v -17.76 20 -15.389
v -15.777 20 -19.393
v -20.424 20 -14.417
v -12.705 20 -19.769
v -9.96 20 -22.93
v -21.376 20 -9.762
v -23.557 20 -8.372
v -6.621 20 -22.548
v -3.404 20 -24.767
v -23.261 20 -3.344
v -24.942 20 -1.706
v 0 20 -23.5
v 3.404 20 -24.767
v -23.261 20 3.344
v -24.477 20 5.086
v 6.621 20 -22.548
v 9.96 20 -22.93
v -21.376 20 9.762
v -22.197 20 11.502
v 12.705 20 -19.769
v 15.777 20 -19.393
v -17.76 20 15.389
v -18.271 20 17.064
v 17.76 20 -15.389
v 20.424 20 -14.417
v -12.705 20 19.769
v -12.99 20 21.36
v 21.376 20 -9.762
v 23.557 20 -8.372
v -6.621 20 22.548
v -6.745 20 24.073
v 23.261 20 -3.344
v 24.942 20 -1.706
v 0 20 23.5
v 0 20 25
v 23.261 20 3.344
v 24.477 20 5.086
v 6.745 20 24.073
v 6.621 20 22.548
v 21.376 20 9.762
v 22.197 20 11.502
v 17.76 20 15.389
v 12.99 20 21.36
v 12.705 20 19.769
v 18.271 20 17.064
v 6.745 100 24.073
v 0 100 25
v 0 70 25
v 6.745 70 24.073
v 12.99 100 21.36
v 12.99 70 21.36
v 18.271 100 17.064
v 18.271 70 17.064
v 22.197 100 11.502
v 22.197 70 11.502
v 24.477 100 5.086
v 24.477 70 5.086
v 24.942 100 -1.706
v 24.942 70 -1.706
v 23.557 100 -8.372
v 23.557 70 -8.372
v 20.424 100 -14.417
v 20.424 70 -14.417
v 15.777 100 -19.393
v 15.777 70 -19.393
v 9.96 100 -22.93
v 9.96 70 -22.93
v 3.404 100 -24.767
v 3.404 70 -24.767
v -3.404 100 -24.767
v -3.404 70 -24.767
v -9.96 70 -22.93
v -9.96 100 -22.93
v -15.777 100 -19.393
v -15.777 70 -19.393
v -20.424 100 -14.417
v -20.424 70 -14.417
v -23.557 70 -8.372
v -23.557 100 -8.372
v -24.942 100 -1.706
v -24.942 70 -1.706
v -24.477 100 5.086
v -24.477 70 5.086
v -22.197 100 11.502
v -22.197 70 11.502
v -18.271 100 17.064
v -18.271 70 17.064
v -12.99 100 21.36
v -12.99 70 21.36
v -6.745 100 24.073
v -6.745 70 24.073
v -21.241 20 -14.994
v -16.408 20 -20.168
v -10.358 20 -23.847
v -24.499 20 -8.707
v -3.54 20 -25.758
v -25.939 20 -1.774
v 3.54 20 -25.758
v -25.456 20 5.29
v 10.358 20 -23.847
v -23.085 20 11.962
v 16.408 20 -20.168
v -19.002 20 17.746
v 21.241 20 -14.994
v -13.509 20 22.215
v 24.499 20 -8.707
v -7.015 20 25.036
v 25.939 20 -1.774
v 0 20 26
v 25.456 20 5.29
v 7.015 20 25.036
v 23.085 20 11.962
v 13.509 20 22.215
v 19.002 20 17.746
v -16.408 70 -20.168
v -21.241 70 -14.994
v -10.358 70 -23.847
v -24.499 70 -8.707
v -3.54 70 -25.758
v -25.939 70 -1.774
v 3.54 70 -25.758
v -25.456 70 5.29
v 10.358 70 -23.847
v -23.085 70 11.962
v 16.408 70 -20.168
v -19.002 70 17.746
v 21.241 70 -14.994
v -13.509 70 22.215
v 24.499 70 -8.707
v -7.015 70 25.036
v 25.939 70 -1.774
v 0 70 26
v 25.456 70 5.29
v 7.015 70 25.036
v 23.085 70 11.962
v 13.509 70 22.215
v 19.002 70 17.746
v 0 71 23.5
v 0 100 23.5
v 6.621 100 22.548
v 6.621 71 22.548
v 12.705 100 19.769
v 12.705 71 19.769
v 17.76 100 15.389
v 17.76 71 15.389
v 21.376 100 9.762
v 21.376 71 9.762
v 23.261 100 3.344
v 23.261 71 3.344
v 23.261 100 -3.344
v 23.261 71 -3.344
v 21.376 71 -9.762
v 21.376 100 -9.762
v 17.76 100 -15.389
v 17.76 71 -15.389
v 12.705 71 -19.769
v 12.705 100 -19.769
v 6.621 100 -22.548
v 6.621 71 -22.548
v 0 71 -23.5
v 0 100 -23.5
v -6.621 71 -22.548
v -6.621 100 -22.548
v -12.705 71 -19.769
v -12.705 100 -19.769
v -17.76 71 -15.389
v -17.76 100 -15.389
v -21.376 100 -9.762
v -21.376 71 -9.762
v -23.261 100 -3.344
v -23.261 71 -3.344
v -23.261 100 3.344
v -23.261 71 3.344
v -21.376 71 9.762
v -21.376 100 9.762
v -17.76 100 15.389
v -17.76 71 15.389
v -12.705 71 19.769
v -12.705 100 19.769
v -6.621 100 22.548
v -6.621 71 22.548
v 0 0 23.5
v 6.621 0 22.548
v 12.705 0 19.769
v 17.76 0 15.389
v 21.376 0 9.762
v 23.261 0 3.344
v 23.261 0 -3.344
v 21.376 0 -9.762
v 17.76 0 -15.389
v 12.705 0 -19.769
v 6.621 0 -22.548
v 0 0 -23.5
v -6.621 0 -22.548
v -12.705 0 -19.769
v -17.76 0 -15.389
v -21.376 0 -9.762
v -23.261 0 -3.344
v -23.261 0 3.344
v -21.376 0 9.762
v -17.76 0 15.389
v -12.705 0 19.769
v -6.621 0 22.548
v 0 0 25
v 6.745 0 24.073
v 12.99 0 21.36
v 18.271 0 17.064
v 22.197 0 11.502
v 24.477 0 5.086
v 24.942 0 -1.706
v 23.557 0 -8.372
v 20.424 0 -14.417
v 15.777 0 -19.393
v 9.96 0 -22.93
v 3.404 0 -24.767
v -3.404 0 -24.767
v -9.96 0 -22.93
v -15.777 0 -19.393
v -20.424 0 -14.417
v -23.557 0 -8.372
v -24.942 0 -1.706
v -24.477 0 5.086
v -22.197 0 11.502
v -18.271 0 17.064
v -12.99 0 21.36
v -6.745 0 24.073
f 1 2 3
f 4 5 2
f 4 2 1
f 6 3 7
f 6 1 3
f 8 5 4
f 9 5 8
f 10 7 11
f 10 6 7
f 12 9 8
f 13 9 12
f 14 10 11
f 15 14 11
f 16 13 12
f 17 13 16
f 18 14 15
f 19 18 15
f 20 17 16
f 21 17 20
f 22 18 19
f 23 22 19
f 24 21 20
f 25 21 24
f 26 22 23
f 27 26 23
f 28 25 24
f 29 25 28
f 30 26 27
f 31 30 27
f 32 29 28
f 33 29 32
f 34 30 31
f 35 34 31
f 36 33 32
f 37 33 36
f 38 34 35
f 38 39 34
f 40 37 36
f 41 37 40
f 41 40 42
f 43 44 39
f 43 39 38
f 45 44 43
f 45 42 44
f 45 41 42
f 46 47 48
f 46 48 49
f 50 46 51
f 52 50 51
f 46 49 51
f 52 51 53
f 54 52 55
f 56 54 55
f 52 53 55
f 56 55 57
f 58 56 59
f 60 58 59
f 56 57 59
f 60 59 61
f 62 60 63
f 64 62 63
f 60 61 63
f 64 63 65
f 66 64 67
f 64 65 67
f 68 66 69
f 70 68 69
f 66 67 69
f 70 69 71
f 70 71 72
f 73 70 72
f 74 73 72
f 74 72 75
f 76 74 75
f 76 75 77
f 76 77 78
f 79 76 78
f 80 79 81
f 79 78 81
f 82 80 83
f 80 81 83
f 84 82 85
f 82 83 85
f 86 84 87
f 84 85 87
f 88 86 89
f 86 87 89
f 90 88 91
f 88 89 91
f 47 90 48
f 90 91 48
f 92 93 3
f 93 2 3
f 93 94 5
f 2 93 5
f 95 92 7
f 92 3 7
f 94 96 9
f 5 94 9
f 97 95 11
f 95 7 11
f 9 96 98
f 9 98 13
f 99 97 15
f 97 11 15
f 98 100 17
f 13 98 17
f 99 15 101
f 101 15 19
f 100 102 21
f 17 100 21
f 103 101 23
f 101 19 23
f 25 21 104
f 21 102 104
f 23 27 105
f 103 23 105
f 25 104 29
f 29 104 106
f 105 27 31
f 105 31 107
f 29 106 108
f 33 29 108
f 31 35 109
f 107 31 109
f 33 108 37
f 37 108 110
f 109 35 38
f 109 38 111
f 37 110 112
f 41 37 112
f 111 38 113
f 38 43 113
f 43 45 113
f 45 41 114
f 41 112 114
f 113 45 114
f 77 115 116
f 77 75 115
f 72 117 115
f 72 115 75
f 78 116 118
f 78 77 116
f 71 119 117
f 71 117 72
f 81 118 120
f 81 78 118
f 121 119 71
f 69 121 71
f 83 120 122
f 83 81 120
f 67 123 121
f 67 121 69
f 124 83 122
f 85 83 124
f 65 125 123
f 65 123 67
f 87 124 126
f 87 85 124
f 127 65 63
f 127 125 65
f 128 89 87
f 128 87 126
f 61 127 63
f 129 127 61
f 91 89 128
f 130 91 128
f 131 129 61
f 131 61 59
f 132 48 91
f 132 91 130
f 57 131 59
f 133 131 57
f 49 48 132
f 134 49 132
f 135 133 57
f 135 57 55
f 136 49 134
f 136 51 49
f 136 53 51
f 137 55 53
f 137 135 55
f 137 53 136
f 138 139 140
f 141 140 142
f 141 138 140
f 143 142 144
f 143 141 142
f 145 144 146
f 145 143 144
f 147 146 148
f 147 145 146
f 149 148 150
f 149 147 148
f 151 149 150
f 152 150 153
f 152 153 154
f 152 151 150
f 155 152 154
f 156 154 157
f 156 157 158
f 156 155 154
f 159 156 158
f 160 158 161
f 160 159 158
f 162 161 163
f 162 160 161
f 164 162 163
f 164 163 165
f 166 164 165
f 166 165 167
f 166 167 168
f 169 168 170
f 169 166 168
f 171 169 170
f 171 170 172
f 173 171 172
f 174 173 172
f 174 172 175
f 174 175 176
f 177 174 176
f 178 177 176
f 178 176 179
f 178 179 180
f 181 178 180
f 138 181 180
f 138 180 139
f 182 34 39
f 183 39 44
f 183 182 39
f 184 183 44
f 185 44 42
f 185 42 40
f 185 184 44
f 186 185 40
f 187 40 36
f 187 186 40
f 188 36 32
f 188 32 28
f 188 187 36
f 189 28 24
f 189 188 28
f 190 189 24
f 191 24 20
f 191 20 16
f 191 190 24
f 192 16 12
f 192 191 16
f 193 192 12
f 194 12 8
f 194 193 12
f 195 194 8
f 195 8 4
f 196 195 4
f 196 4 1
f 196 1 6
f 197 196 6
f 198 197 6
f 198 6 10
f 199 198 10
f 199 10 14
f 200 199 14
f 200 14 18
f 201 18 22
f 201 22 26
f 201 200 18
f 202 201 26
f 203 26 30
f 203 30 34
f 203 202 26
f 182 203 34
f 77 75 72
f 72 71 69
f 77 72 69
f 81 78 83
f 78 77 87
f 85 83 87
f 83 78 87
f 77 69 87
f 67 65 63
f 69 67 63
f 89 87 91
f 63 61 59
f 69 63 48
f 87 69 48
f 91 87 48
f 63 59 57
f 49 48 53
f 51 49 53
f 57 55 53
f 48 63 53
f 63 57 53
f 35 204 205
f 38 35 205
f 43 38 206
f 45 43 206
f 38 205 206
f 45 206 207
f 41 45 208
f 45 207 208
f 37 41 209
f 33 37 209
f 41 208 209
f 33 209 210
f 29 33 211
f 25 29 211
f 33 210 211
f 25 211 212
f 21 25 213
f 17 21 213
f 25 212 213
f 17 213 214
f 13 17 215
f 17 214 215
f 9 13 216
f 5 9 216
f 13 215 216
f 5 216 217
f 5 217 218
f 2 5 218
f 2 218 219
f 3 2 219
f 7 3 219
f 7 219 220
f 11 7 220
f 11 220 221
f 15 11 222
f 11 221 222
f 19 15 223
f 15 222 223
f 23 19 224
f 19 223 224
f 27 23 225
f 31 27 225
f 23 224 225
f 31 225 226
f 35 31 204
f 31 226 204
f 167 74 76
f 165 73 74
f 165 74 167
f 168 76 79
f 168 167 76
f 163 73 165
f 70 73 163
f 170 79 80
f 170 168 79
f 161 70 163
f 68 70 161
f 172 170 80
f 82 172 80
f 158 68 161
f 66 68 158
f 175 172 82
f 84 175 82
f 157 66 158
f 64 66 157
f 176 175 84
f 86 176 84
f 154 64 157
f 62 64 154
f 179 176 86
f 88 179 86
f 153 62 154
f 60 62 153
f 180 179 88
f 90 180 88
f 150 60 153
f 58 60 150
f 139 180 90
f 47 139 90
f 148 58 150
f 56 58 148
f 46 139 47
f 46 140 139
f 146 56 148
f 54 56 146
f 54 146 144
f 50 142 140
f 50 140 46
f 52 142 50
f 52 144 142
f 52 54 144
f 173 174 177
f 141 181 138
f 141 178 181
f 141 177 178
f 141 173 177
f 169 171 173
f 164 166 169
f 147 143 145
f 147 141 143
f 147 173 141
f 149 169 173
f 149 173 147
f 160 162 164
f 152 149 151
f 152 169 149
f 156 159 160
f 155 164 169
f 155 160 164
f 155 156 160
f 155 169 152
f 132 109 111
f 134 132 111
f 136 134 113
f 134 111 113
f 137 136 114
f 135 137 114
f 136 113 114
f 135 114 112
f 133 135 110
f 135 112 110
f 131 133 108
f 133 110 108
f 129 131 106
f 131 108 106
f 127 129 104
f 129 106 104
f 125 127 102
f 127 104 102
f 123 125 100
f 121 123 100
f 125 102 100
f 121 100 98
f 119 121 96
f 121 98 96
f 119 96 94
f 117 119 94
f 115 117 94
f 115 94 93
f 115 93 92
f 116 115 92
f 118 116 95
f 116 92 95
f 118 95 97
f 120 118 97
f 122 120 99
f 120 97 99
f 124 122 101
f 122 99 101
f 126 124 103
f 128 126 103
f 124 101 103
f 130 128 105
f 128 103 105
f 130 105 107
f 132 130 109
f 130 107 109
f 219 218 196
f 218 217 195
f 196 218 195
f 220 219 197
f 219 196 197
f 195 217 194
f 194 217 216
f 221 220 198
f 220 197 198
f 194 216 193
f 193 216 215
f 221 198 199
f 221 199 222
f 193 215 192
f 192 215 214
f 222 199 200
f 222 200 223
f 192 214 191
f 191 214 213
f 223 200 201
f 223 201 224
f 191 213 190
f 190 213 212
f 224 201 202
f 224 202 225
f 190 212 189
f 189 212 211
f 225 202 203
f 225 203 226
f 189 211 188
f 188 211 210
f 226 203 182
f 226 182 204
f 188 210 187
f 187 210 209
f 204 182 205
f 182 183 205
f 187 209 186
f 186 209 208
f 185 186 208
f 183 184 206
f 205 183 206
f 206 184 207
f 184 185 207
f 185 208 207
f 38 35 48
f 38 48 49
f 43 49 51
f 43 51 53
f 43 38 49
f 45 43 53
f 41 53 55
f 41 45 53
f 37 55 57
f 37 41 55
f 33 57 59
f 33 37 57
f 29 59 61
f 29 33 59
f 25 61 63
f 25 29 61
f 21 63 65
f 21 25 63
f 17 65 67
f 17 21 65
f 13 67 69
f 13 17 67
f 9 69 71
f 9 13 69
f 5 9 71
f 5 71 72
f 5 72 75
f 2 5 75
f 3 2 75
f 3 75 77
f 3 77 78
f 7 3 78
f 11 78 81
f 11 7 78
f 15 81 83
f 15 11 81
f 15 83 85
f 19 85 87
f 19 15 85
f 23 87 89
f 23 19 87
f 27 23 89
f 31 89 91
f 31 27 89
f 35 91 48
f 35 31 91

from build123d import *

# Parameters (mm, degrees)
ESBO_O1_R                = 25
ESBO_O1_R_2              = 23.5
RESSALTO_EXTRUS_O1_DEPTH = 20
ESBO_O2_R                = 26
ESBO_O2_R_2              = 25
RESSALTO_EXTRUS_O2_DEPTH = 50
ESBO_O3_R                = 25
ESBO_O3_R_2              = 23.5
RESSALTO_EXTRUS_O3_DEPTH = 30
ESBO_O18_R               = 24
RESSALTO_EXTRUS_O4_DEPTH = 1


with BuildPart() as part:
    # Esboço1 → Ressalto-extrusão1 (new body)
    with BuildSketch(Plane(origin=(0, 0, 0), x_dir=(1, 0, 0), z_dir=(0, 1, 0))):
        with Locations(Location((0, 0, 0), (0, 0, 270))):
            Circle(ESBO_O1_R)
        with Locations(Location((0, 0, 0), (0, 0, 270))):
            Circle(ESBO_O1_R_2, mode=Mode.SUBTRACT)
    extrude(amount=RESSALTO_EXTRUS_O1_DEPTH)


with BuildPart() as body_2:
    # Esboço2 → Ressalto-extrusão2 (new body)
    with BuildSketch(Plane(origin=(0, 20, 0), x_dir=(1, 0, 0), z_dir=(0, 1, 0))):
        with Locations(Location((0, 0, 0), (0, 0, 270))):
            Circle(ESBO_O2_R)
        with Locations(Location((0, 0, 0), (0, 0, 270))):
            Circle(ESBO_O2_R_2, mode=Mode.SUBTRACT)
    extrude(amount=RESSALTO_EXTRUS_O2_DEPTH)


with BuildPart() as body_3:
    # Esboço3 → Ressalto-extrusão3 (new body)
    with BuildSketch(Plane(origin=(0, 70, 0), x_dir=(1, 0, 0), z_dir=(0, 1, 0))):
        with Locations(Location((0, 0, 0), (0, 0, 270))):
            Circle(ESBO_O3_R)
        with Locations(Location((0, 0, 0), (0, 0, 270))):
            Circle(ESBO_O3_R_2, mode=Mode.SUBTRACT)
    extrude(amount=RESSALTO_EXTRUS_O3_DEPTH)

    # Esboço18 → Ressalto-extrusão4 (add)
    with BuildSketch(Plane(origin=(0, 70, 0), x_dir=(1, 0, 0), z_dir=(0, 1, 0))):
        Circle(ESBO_O18_R)
    extrude(amount=RESSALTO_EXTRUS_O4_DEPTH)


solid = Compound([part.part, body_2.part, body_3.part])
